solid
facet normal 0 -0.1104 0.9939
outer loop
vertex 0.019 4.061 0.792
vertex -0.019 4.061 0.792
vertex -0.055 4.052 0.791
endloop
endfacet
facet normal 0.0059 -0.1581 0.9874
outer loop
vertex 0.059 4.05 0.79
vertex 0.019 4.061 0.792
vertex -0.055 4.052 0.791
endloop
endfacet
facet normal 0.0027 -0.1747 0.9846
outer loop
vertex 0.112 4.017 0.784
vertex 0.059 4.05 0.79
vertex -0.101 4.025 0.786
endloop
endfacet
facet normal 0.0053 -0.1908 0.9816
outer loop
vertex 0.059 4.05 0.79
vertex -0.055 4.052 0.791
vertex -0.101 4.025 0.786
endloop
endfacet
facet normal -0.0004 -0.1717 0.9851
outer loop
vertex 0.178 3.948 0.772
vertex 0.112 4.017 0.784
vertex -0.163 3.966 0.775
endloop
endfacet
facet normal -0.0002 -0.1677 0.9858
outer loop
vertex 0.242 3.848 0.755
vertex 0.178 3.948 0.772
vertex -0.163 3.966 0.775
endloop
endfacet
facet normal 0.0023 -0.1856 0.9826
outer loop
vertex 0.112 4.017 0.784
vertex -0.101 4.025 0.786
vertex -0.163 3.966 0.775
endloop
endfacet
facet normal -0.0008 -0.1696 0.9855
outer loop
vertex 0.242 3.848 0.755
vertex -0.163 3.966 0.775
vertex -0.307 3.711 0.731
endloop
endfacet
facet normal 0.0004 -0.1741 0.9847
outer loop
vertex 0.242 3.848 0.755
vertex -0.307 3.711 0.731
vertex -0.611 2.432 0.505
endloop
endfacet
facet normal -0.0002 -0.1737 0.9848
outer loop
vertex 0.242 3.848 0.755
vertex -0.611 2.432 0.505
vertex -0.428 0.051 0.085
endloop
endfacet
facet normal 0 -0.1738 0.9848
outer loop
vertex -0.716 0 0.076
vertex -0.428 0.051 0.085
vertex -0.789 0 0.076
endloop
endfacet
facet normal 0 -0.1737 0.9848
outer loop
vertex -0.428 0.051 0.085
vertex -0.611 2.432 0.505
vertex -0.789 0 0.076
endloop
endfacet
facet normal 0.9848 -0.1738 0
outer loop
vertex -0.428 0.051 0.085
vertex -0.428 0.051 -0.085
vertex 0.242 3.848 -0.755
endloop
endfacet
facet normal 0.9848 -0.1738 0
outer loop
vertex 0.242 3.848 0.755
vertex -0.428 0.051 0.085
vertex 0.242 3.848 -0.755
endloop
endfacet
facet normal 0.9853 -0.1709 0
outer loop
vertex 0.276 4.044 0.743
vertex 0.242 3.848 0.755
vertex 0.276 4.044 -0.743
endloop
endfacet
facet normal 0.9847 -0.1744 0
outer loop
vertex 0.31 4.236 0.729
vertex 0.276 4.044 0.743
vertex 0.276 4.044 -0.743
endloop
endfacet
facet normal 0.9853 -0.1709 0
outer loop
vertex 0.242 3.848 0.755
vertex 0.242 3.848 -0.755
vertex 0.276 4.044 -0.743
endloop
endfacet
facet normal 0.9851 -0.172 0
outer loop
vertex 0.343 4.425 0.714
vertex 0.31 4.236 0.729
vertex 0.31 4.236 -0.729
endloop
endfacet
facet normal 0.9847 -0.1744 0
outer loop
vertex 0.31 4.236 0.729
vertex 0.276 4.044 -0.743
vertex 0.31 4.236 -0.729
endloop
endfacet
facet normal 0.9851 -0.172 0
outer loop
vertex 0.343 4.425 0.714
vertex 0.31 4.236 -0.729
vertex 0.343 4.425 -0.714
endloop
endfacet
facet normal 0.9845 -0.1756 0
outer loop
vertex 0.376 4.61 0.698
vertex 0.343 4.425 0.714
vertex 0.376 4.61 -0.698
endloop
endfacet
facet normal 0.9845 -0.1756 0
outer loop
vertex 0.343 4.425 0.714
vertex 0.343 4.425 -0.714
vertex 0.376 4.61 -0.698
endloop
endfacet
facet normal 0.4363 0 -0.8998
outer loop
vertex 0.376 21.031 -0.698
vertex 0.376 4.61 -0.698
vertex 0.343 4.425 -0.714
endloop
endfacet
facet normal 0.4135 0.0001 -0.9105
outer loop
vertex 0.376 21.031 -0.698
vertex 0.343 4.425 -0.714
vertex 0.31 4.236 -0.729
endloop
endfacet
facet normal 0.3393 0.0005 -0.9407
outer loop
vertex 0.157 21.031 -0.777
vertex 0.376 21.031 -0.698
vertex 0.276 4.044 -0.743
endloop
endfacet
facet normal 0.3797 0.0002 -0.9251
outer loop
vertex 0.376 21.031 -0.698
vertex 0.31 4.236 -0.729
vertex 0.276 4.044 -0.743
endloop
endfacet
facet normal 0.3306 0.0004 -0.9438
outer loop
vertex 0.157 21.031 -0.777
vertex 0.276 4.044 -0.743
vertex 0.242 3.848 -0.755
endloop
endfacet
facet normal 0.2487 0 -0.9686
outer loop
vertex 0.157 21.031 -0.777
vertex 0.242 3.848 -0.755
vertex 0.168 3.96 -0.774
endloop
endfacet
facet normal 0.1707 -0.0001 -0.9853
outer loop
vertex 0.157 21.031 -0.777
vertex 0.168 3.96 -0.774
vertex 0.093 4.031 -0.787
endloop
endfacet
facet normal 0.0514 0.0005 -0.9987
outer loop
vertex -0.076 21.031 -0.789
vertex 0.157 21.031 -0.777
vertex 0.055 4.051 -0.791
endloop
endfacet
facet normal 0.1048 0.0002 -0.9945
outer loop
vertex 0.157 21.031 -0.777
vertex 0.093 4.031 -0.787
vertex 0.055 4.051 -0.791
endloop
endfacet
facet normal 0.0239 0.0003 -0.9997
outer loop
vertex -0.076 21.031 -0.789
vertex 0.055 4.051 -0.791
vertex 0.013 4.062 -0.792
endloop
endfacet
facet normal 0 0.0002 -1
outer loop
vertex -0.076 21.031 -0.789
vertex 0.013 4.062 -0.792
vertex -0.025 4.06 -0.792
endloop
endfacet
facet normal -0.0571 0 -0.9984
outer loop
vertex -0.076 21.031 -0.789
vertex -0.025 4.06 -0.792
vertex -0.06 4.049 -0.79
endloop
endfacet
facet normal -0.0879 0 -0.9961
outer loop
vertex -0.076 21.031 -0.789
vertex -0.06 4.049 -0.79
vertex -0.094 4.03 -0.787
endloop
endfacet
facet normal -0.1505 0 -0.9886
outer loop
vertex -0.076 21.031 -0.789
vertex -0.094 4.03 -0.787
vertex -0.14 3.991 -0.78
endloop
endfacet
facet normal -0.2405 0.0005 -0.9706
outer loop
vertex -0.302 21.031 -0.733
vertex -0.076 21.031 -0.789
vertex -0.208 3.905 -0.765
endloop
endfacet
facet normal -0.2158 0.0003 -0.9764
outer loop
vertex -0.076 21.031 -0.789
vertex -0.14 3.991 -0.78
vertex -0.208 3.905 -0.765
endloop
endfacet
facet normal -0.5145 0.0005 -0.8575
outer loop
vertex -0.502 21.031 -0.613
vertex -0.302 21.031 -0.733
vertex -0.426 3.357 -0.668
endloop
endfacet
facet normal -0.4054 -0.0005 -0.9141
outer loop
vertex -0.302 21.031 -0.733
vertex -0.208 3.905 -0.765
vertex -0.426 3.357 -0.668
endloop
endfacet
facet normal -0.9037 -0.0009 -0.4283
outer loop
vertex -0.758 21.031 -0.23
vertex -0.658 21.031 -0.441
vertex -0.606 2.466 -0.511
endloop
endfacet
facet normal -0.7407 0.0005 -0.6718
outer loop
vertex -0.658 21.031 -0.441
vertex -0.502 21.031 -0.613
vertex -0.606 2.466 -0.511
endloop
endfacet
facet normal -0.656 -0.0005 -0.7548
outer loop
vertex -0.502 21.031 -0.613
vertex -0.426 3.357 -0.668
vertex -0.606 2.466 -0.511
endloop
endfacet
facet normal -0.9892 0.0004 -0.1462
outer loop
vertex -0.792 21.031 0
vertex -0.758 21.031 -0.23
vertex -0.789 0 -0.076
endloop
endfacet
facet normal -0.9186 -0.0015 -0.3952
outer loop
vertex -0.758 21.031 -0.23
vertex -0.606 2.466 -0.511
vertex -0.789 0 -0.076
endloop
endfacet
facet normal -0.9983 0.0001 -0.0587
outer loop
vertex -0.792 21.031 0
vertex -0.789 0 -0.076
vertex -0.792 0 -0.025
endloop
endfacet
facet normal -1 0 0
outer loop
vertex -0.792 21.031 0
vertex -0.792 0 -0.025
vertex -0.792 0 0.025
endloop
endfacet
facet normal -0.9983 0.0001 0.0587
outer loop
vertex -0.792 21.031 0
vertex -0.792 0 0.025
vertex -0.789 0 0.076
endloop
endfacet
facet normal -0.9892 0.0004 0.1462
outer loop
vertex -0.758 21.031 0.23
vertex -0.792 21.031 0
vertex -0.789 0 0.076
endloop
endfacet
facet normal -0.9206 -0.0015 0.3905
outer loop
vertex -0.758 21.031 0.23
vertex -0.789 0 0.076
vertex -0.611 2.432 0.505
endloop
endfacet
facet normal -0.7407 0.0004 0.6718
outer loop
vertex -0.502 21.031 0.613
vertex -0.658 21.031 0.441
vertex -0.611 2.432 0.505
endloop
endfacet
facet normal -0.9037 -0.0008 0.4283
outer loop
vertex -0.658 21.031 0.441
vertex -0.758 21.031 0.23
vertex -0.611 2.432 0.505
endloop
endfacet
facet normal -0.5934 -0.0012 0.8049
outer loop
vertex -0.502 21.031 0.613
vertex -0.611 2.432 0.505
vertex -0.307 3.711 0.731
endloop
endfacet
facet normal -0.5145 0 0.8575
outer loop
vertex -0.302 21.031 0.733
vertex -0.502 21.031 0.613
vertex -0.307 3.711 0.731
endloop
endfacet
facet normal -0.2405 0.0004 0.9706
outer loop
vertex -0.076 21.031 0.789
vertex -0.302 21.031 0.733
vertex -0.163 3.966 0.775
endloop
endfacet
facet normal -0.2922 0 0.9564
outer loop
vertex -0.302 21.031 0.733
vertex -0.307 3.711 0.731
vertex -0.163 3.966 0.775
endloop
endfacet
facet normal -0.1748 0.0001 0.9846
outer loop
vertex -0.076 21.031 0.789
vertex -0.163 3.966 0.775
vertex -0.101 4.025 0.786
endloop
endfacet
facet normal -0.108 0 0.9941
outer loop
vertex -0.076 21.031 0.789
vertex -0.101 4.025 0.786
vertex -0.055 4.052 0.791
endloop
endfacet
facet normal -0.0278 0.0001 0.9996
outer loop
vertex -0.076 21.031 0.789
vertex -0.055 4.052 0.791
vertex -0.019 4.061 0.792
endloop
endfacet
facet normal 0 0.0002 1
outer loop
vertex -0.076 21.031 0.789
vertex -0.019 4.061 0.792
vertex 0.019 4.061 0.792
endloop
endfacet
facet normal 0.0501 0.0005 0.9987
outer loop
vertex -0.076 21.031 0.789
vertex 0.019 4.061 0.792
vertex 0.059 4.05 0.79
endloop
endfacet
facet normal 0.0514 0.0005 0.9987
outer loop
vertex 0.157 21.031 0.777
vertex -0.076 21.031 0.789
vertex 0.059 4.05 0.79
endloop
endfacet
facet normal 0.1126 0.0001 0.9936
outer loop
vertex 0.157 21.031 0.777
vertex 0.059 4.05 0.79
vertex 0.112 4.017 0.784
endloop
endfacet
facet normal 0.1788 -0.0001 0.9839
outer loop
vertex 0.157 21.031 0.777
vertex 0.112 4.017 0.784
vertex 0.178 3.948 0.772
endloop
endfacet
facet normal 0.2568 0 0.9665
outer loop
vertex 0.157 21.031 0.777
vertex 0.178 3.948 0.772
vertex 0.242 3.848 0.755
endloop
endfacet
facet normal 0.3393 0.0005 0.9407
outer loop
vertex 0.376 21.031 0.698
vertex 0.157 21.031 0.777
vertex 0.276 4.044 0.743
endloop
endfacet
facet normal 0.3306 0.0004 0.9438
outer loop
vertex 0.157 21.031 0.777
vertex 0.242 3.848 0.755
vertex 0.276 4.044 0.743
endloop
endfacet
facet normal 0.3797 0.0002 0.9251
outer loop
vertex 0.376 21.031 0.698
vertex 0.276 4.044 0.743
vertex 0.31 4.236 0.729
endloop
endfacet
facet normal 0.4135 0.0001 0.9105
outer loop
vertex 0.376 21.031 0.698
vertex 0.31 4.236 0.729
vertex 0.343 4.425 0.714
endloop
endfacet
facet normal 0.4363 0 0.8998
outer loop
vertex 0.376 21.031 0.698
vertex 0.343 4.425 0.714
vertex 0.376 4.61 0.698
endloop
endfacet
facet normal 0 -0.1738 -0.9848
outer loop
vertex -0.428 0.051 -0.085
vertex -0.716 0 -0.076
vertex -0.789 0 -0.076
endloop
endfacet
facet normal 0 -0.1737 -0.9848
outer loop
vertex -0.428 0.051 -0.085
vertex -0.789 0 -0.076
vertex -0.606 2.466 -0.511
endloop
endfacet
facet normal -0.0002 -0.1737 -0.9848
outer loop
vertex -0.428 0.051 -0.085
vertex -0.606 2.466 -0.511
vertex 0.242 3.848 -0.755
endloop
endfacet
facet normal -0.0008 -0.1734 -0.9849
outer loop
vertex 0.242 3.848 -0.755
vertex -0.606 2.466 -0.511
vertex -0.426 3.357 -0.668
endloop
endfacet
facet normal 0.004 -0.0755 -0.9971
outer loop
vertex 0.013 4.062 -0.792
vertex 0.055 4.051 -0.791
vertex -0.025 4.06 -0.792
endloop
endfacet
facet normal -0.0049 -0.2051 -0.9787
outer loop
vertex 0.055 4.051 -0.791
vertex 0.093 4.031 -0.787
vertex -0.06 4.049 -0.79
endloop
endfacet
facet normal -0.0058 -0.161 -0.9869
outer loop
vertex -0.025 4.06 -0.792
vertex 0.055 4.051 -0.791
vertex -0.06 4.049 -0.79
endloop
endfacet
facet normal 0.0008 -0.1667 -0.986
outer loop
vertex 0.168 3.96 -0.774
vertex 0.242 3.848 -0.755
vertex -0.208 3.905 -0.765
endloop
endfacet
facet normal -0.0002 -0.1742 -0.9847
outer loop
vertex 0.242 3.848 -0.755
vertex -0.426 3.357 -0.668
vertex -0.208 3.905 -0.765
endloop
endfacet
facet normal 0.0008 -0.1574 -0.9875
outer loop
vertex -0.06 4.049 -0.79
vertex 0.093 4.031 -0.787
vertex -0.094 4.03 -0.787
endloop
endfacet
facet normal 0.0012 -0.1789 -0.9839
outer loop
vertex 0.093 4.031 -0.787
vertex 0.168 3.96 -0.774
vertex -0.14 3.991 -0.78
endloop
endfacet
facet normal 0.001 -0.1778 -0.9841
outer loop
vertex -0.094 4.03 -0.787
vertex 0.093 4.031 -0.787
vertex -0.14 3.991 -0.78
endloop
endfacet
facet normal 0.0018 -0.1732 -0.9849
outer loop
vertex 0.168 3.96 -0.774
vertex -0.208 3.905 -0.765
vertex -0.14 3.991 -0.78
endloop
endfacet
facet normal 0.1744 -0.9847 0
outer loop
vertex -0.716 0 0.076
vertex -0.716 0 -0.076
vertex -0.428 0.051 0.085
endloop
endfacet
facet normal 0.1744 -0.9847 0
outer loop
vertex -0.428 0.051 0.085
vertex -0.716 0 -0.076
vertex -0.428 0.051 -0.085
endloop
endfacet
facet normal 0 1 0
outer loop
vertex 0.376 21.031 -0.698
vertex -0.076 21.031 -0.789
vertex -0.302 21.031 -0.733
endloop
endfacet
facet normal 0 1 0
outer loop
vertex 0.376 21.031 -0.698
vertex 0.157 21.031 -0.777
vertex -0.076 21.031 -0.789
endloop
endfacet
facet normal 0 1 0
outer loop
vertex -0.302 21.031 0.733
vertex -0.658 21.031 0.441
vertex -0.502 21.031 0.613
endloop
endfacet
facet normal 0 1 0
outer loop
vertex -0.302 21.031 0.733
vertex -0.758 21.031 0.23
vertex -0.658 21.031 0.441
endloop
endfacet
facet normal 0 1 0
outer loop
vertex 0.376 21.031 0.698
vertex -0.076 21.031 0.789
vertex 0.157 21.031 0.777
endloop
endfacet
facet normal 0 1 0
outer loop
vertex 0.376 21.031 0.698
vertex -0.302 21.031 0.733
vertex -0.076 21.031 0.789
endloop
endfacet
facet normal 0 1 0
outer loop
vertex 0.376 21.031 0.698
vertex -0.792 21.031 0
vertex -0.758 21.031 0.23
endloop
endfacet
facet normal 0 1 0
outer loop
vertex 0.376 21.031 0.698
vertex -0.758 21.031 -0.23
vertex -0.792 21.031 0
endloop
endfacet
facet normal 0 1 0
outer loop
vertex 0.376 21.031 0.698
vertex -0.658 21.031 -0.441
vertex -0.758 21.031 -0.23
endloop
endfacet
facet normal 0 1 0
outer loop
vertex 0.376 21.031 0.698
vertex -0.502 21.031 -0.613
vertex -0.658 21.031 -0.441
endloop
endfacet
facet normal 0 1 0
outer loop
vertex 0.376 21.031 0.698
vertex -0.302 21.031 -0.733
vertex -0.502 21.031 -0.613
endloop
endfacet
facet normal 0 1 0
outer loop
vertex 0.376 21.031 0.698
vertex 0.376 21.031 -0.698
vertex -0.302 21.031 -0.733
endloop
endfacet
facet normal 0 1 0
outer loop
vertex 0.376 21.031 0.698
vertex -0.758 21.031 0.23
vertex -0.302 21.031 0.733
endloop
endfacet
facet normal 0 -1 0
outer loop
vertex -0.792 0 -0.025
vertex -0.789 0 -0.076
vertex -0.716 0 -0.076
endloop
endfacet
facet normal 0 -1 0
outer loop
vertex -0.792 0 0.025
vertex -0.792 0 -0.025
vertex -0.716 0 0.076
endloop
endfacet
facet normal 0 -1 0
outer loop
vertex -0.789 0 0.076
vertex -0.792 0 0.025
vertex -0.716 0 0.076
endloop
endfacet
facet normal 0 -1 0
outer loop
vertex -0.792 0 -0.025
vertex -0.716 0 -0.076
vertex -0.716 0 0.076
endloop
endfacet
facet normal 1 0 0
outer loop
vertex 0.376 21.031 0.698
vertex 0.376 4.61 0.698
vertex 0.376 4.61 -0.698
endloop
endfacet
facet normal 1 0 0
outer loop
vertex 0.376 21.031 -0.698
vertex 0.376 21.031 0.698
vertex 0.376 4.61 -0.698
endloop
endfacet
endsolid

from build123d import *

# Parameters (mm, degrees)
TD_SKETCH_R                           = 0.79248
TL_FEATURE_DEPTH                      = 21.0312
TDF_180_DEG_REV_SKETCH_W              = 1.60495996
TDF_180_DEG_REV_SKETCH_H              = 1.60495996
TDF_180_DEG_REV_FEATURE_DEPTH         = 22.061040395
ISA_20_180_DEG_REV_FEATURE_DEPTH      = 22.061040395
ISA_20_180_DEG_REV_FEATURE_DEPTH_BACK = 22.061040395
F_10BA_180_DEG_REV_FEATURE_DEPTH      = 22.061040395
F_10BA_180_DEG_REV_FEATURE_DEPTH_BACK = 22.061040395


with BuildPart() as part:
    # TD_sketch → TL_feature (new body)
    with BuildSketch(Plane(origin=(0, 0, 0), x_dir=(1, 0, 0), z_dir=(0, 1, 0))):
        Circle(TD_SKETCH_R)
    extrude(amount=TL_FEATURE_DEPTH)

    # TDF_180_DEG_REV_sketch → TDF_180_DEG_REV_feature (cut, through all)
    with BuildSketch(Plane(origin=(0, 0, 0), x_dir=(1, 0, 0), z_dir=(0, 1, 0))):
        with Locations((1.17839998, 0)):
            Rectangle(TDF_180_DEG_REV_SKETCH_W, TDF_180_DEG_REV_SKETCH_H)
    extrude(amount=TDF_180_DEG_REV_FEATURE_DEPTH, mode=Mode.SUBTRACT)

    # ISA_20_180_DEG_REV_sketch → ISA_20_180_DEG_REV_feature (cut, two sides: drawn at the far end of the back side and taken through both)
    with BuildSketch(Plane(origin=(0, 0, 0), x_dir=(0, 0, -1), z_dir=(1, 0, 0)).offset(-ISA_20_180_DEG_REV_FEATURE_DEPTH_BACK)):
        Polygon((-12.996080373, 73.27228267), (-3.784567997, 21.0312), (-0.0762, 0), (0.0762, 0), (3.784567997, 21.0312), (12.996080373, 73.27228267), (12.996080373, -32.821688483), (-12.996080373, -32.821688483), align=None)
    extrude(amount=ISA_20_180_DEG_REV_FEATURE_DEPTH + ISA_20_180_DEG_REV_FEATURE_DEPTH_BACK, mode=Mode.SUBTRACT)

    # 10BA_180_DEG_REV_sketch → 10BA_180_DEG_REV_feature (cut, two sides: drawn at the far end of the back side and taken through both)
    with BuildSketch(Plane.XY.offset(-F_10BA_180_DEG_REV_FEATURE_DEPTH_BACK)):
        Polygon((-53.632984634, 0), (-0.79248, 0), (-0.71628, 0), (-0.427914365, 0.050846642), (3.271487997, 21.0312), (12.447145333, 73.068938636), (90.829329802, 2.18375769), (24.749199835, -70.885180946), align=None)
    extrude(amount=F_10BA_180_DEG_REV_FEATURE_DEPTH + F_10BA_180_DEG_REV_FEATURE_DEPTH_BACK, mode=Mode.SUBTRACT)


solid = part.part
